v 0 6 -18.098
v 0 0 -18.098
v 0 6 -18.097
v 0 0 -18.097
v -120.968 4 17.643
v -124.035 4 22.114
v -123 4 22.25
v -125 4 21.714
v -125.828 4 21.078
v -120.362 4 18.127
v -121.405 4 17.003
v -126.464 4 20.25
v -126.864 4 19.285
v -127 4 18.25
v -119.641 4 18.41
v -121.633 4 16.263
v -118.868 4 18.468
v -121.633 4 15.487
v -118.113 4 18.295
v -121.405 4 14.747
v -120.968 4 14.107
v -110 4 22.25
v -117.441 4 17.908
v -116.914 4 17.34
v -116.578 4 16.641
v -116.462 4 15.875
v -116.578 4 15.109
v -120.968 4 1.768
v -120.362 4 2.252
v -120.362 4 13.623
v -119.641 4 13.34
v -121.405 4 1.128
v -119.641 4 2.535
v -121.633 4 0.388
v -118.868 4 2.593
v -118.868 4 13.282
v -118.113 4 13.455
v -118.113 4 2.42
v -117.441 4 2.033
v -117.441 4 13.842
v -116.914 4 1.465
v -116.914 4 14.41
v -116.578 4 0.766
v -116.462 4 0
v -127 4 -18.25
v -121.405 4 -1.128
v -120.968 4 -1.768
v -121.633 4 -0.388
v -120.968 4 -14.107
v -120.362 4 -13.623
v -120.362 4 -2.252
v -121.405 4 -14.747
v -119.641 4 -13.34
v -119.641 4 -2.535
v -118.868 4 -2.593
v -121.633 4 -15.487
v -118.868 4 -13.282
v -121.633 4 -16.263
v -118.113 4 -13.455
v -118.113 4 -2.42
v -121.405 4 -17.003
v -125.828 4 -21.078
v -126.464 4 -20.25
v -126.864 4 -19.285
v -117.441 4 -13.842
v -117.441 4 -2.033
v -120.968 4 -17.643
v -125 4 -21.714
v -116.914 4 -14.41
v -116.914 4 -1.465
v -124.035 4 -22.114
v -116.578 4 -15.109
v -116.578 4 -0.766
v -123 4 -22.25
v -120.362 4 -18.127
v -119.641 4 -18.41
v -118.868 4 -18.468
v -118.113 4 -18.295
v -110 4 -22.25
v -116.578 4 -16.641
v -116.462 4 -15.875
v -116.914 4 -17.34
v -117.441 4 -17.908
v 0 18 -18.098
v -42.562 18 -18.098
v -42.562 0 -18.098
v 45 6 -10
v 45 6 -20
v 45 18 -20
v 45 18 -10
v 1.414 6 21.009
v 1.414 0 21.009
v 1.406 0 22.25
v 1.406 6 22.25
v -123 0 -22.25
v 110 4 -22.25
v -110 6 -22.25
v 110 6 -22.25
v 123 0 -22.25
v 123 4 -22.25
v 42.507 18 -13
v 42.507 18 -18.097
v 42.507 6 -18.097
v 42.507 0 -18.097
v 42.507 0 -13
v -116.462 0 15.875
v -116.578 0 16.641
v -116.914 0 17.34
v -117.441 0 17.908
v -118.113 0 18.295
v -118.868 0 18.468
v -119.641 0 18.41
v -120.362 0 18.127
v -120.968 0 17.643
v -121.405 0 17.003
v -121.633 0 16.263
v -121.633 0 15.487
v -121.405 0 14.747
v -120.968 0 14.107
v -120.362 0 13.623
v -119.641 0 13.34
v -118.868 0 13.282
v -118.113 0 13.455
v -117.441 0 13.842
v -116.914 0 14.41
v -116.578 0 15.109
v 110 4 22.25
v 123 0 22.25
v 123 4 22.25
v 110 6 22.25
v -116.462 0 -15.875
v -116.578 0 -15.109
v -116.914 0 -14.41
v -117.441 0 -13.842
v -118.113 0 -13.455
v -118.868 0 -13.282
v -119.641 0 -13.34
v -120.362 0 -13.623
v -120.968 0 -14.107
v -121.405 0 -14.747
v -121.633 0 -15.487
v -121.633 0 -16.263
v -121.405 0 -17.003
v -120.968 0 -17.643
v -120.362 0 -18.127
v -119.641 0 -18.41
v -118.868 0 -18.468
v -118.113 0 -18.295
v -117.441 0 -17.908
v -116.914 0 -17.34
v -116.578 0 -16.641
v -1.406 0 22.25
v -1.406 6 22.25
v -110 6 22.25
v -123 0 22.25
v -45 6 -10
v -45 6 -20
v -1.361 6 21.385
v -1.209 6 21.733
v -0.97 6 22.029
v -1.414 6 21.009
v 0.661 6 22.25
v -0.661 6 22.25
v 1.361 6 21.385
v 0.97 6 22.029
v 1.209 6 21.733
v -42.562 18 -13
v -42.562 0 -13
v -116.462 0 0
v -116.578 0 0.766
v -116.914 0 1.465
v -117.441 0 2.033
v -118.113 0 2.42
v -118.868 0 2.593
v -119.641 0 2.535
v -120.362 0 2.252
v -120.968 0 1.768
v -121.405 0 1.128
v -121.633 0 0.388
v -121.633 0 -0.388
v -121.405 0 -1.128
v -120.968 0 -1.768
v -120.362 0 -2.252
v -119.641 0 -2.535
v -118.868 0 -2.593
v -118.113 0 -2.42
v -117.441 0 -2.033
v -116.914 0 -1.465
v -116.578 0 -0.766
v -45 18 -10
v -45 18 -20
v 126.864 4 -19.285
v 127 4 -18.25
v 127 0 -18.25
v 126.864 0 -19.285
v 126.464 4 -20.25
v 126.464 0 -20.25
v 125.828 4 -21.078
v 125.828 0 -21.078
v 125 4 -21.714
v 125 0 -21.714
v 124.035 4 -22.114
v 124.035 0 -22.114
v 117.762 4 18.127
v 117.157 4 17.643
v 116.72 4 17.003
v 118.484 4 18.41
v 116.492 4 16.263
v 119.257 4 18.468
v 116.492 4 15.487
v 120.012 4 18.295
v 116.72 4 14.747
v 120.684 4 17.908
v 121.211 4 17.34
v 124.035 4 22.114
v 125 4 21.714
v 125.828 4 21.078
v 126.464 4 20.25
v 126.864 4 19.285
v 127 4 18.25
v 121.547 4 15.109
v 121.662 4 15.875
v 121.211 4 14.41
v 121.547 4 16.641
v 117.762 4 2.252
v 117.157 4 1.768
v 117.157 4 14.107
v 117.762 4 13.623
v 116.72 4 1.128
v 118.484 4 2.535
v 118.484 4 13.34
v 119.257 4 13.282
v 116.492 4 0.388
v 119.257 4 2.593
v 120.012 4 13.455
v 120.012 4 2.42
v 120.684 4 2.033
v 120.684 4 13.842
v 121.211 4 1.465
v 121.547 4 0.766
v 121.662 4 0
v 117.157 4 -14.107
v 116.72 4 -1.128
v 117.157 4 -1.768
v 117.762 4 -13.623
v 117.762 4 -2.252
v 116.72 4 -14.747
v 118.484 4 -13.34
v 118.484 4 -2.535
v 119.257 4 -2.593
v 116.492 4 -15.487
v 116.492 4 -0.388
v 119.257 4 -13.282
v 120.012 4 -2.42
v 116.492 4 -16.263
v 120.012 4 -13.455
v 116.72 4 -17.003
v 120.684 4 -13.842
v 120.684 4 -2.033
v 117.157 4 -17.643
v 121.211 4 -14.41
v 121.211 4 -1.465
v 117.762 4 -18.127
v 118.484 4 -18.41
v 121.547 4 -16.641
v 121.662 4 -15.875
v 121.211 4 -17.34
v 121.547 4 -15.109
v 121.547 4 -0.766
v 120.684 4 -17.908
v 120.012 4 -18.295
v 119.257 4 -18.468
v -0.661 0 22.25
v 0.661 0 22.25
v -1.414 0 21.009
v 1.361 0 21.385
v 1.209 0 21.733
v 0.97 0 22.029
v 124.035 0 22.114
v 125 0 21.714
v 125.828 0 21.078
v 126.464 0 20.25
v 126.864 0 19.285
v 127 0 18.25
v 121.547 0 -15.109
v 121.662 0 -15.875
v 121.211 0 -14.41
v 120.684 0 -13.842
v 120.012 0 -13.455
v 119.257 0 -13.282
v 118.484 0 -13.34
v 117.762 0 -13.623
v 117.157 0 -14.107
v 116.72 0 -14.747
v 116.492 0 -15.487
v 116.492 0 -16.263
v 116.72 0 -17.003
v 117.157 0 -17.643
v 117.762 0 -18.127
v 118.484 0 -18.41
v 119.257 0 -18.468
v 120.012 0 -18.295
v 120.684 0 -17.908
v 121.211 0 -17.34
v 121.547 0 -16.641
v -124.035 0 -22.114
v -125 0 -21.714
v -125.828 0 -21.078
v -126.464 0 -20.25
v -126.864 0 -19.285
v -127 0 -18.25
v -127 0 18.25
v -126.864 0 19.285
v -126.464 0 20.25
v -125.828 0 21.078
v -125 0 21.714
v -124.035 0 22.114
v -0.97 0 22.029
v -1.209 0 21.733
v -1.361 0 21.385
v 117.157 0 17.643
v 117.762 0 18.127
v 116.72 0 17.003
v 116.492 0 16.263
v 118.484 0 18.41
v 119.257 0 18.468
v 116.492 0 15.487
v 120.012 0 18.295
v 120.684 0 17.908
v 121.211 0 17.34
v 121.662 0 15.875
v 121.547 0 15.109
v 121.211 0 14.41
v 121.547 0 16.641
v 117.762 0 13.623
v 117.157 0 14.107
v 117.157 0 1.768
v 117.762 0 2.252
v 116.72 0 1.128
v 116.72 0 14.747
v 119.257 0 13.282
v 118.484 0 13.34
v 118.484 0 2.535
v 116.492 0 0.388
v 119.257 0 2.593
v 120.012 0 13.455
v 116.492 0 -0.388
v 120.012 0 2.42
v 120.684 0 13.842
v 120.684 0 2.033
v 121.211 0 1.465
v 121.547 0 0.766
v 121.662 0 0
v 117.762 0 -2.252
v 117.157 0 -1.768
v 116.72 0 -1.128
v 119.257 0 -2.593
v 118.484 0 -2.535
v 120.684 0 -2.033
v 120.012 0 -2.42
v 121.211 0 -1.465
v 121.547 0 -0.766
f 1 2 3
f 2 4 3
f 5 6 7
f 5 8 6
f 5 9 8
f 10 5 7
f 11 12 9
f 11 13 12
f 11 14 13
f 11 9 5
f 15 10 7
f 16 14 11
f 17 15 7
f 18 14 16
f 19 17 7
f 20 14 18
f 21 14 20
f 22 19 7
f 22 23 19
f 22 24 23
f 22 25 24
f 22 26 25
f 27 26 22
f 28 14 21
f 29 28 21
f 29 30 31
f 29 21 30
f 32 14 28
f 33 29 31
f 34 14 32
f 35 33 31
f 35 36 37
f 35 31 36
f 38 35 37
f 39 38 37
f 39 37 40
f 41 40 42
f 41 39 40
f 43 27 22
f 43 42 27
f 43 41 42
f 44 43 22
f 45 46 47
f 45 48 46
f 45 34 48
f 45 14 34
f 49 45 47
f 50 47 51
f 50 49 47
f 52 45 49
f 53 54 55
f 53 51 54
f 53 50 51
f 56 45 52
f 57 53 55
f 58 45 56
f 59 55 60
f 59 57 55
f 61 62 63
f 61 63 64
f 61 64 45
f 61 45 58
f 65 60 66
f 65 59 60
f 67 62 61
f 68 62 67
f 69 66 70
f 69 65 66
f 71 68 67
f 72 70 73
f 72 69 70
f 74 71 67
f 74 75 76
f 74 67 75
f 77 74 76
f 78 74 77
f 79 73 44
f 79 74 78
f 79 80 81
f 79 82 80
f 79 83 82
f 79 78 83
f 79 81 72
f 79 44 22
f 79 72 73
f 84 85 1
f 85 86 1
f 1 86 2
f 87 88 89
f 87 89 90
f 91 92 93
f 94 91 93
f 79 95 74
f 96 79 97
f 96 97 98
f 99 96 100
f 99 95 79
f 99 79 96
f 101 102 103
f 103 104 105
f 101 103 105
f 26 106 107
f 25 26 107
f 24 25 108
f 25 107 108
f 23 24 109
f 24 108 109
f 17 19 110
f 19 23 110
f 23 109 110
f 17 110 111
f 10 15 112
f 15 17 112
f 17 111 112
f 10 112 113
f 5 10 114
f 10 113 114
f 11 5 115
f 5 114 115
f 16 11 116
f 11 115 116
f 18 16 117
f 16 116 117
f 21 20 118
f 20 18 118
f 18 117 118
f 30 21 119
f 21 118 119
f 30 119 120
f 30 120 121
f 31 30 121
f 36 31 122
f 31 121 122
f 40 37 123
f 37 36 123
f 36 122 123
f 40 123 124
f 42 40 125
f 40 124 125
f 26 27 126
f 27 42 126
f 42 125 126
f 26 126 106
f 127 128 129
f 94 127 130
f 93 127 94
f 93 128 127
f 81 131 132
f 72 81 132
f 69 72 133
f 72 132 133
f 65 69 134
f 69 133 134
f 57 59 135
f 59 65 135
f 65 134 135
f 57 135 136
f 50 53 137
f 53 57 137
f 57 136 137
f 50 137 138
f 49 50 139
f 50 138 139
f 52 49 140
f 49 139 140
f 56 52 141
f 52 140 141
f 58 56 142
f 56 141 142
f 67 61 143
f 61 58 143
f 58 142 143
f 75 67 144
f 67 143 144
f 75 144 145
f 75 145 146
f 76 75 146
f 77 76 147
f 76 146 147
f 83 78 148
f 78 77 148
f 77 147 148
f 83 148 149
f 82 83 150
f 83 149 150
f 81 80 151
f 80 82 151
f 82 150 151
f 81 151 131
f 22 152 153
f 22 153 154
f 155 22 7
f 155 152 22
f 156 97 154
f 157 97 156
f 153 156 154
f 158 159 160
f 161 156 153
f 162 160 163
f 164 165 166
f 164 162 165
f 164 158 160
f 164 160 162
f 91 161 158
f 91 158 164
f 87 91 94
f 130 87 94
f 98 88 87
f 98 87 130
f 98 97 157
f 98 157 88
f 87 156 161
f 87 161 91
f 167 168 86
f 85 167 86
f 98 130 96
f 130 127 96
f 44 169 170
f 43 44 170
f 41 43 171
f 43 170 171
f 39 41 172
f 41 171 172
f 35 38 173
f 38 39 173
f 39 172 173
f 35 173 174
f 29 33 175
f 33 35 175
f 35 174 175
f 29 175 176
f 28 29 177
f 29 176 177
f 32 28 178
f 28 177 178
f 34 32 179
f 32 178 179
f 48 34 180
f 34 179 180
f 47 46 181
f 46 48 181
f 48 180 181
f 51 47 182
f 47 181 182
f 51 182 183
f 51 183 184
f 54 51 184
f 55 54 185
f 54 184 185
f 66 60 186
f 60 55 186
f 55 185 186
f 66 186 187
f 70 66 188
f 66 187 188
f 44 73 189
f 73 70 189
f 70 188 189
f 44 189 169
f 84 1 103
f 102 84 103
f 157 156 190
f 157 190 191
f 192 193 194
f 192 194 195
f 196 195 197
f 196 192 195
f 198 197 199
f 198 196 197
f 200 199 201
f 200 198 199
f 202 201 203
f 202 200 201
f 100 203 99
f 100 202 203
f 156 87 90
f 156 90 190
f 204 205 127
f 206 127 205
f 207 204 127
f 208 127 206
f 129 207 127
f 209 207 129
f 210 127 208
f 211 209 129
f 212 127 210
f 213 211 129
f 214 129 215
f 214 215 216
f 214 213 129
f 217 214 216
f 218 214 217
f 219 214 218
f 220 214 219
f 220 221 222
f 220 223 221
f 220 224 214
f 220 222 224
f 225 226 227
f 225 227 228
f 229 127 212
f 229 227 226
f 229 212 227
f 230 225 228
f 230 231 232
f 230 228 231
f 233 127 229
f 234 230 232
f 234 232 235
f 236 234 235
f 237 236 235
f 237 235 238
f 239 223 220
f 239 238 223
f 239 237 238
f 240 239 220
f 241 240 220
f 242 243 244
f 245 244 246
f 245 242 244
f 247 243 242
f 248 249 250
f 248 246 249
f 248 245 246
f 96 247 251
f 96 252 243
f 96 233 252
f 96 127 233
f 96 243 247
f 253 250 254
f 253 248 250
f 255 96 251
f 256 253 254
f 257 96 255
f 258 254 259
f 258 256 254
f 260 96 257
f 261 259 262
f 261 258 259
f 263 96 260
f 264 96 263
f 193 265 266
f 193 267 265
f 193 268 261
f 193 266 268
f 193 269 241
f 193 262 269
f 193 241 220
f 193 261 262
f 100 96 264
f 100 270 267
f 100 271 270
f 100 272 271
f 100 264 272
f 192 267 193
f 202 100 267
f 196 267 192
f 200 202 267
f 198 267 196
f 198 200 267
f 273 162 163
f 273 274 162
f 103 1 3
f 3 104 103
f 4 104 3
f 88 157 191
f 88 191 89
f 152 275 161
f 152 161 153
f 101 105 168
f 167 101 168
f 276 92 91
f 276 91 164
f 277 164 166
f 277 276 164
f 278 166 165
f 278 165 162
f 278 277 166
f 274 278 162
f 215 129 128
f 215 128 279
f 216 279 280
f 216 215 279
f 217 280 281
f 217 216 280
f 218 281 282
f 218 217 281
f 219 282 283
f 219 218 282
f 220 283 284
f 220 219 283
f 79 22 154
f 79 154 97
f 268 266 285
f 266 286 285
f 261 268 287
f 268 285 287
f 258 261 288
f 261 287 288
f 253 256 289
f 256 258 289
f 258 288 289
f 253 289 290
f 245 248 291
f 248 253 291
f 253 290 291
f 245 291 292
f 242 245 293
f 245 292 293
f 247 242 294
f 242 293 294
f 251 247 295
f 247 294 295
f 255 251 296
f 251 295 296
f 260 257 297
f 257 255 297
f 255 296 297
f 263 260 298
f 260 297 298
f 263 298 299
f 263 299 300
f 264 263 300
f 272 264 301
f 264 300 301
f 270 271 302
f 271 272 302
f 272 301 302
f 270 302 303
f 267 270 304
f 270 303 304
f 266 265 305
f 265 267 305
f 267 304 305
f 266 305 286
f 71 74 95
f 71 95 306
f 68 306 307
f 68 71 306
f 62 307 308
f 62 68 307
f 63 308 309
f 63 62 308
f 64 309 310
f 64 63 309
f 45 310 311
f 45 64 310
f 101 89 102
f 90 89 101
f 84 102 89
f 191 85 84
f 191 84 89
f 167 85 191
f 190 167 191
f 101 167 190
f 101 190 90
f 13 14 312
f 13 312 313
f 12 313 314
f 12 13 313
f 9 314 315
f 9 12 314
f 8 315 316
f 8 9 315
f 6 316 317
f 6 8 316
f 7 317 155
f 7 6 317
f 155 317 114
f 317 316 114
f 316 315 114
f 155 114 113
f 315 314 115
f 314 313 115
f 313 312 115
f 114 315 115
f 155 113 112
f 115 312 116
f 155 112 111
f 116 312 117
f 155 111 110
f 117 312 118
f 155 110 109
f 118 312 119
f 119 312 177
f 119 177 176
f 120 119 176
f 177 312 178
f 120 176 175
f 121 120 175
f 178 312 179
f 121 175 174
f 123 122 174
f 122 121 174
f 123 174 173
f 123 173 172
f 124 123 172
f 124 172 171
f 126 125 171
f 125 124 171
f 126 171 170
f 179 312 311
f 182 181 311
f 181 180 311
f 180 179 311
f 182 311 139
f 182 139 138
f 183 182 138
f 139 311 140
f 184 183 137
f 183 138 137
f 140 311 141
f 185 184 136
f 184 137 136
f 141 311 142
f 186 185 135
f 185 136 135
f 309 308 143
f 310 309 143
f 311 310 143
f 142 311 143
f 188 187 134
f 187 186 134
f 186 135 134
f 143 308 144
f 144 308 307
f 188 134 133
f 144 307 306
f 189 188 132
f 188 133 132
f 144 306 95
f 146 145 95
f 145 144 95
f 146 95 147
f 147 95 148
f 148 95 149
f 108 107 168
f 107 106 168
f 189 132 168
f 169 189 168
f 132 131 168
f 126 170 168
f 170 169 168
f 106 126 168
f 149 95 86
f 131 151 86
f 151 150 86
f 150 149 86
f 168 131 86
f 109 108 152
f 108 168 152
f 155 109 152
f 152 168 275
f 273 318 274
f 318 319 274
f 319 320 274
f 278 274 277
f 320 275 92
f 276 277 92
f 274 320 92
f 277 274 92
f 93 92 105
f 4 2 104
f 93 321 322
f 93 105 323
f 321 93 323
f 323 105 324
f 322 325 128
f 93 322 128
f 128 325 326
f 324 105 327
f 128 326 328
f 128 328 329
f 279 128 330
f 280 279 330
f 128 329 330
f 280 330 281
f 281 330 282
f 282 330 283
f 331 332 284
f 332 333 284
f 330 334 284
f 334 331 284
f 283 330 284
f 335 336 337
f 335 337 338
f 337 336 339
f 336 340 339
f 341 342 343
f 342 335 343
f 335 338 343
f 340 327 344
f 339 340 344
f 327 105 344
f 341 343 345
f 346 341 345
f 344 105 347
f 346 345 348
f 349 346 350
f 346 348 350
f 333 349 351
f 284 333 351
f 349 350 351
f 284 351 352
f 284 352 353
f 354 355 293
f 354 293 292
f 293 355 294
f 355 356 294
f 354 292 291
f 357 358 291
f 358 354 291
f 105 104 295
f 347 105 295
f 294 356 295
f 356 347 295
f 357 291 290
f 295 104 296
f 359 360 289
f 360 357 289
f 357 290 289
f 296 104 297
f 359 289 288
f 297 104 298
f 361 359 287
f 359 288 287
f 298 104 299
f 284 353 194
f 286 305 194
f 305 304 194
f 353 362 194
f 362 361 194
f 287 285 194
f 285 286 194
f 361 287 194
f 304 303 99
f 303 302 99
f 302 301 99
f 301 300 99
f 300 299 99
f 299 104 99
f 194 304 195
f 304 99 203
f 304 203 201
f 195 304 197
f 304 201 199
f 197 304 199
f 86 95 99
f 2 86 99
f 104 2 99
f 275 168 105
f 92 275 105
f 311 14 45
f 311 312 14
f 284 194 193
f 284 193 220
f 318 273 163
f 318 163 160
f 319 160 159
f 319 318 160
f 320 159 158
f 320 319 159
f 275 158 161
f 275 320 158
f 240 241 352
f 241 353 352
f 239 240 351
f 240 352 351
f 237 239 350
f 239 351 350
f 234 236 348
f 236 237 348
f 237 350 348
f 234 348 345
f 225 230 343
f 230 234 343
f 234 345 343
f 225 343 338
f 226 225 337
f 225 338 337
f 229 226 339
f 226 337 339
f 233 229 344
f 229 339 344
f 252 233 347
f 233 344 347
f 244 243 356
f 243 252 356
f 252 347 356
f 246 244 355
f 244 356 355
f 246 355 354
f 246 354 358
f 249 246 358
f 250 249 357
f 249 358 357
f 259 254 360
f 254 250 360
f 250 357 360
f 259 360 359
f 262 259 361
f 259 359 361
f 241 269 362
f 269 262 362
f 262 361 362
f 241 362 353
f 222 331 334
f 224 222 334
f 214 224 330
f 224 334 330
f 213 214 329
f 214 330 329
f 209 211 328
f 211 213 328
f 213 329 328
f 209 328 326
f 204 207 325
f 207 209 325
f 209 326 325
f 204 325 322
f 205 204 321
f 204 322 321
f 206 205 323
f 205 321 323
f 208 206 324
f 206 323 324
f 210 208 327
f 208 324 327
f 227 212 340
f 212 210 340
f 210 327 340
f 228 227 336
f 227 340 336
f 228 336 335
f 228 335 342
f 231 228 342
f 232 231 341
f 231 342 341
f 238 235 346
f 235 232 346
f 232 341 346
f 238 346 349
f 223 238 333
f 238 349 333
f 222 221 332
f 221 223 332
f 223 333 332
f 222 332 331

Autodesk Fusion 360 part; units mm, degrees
sketch "Sketch1" plane through (0, 0, 0) normal (0, 1, 0) x (1, 0, 0)
  line L0 (127, -22.25) -> (-127, -22.25)
  line L1 (-127, -22.25) -> (-127, 22.25)
  line L2 (-127, 22.25) -> (127, 22.25)
  line L3 (127, 22.25) -> (127, -22.25)
  line L4 (127, -22.25) -> (-127, 22.25) construction
  line L5 (-127, -22.25) -> (127, 22.25) construction
  line L6 (-127, -22.25) -> (-111.125, -22.25) construction
  line L7 (-111.125, -22.25) -> (-111.125, 22.25) construction
  line L8 (-111.125, 22.25) -> (-127, 22.25) construction
  line L9 (-127, 22.25) -> (-127, -22.25) construction
  line L10 (-127, -22.25) -> (-110, -22.25)
  line L11 (-110, -22.25) -> (-110, 22.25)
  line L12 (-110, 22.25) -> (-127, 22.25)
  line L13 (-127, 22.25) -> (-127, -22.25)
  line L14 (-127, -22.25) -> (-111.125, 22.25) construction
  circle A0 centre (-119.0625, 0) radius 2.6
  circle A1 centre (-119.0625, 0) radius 2.5 construction
  circle A2 centre (-119.0625, -15.875) radius 2.6
  circle A3 centre (-119.0625, 15.875) radius 2.6
  line L15 (0, -22.25) -> (0, 22.25) construction
  circle A4 centre (119.0625, -15.875) radius 2.6
  line L16 (127, 22.25) -> (127, -22.25)
  line L17 (111.125, -22.25) -> (111.125, 22.25) construction
  line L18 (127, -22.25) -> (111.125, 22.25) construction
  line L19 (127, -22.25) -> (127, 22.25)
  line L20 (110, -22.25) -> (110, 22.25)
  line L21 (127, -22.25) -> (111.125, -22.25) construction
  circle A5 centre (119.0625, 0) radius 2.5 construction
  line L22 (111.125, 22.25) -> (127, 22.25) construction
  circle A6 centre (119.0625, 15.875) radius 2.6
  line L23 (110, 22.25) -> (127, 22.25)
  line L24 (127, 22.25) -> (127, -22.25) construction
  circle A7 centre (119.0625, 0) radius 2.6
  line L25 (127, -22.25) -> (110, -22.25)
  dimension "d1" = 254
  dimension "d2" = 44.5
  dimension "d3" = 15.875
  dimension "d4" = 17
  dimension "d5" = 5.2
  dimension "d9" = 0
  dimension "d10" = 15.875
  dimension "d18" = 15.875
extrude "Extrude1" add sketch "Sketch1" along normal blind 4
extrude "Extrude2" add sketch "Sketch1" along normal blind 6 contours L0 L2 L11 L20
fillet "Fillet1" radius 4 4 edges at (127, 2, 22.25) (127, 2, -22.25) (-127, 2, -22.25) (-127, 2, 22.25)
sketch "Sketch2" plane through (0, 0, 0) normal (0, 1, 0) x (1, 0, 0)
  line L0 (0, 13) -> (-42.5625, 13)
  line L1 (-42.5625, 13) -> (-42.5625, 18.0675)
  line L2 (-42.5625, 18.0675) -> (0, 18.0675)
  line L3 (0, 18.0675) -> (0, 13)
  line L4 (0, 13) -> (42.5073, 13)
  line L5 (42.5073, 13) -> (42.5073, 18.0969)
  line L6 (42.5073, 18.0969) -> (0, 18.0969)
  line L7 (0, 18.0969) -> (0, 13)
extrude "Extrude3" cut sketch "Sketch2" along normal blind 460
extrude "Extrude4" cut 1 faces at (-28.375, 4, -18.0675) along direction (0, 0, -1) blind 0.03
sketch "Sketch3" plane through (0, 6, 0) normal (0, 1, 0) x (-1, 0, 0)
  line L0 (0, -18.0975) -> (0, -18.0969)
  line L1 (0, -18.0969) -> (-42.5073, -18.0969)
  line L2 (-42.5073, -18.0969) -> (-42.5073, -13)
  line L3 (-42.5073, -13) -> (42.5625, -13)
  line L4 (42.5625, -13) -> (42.5625, -18.0975)
  line L5 (42.5625, -18.0975) -> (0, -18.0975)
  line L6 (110, 22.25) -> (-110, 22.25)
  line L7 (-110, 22.25) -> (-110, -22.25)
  line L8 (-110, -22.25) -> (110, -22.25)
  line L9 (110, -22.25) -> (110, 22.25)
  line L10 (-45, -10) -> (45, -10)
  line L11 (45, -10) -> (45, -20)
  line L12 (45, -20) -> (-45, -20)
  line L13 (-45, -20) -> (-45, -10)
extrude "Extrude5" add sketch "Sketch3" along normal blind 12 contours L10 L11 L12 L13
sketch "Sketch4" plane through (0, 0, 0) normal (0, -1, 0) x (1, 0, 0)
  arc A0 (-123, 22.25) -> (-127, 18.25) centre (-123, 18.25) ccw
  line L0 (-127, 18.25) -> (-127, -18.25)
  arc A1 (-127, -18.25) -> (-123, -22.25) centre (-123, -18.25) ccw
  line L1 (-123, -22.25) -> (123, -22.25)
  arc A2 (123, -22.25) -> (127, -18.25) centre (123, -18.25) ccw
  line L2 (127, -18.25) -> (127, 18.25)
  arc A3 (127, 18.25) -> (123, 22.25) centre (123, 18.25) ccw
  line L3 (123, 22.25) -> (-123, 22.25)
  circle A4 centre (119.0625, 0) radius 2.6
  circle A5 centre (119.0625, 15.875) radius 2.6
  circle A6 centre (119.0625, -15.875) radius 2.6
  circle A7 centre (-119.0625, 15.875) radius 2.6
  circle A8 centre (-119.0625, -15.875) radius 2.6
  circle A9 centre (-119.0625, 0) radius 2.6
  line L4 (0, -18.0969) -> (0, -18.0975)
  line L5 (0, -18.0975) -> (-42.5625, -18.0975)
  line L6 (-42.5625, -18.0975) -> (-42.5625, -13)
  line L7 (-42.5625, -13) -> (42.5073, -13)
  line L8 (42.5073, -13) -> (42.5073, -18.0969)
  line L9 (42.5073, -18.0969) -> (0, -18.0969)
  circle A10 centre (0, 21) radius 1.4142
  line L10 (-1.4142, 21.0088) -> (-1.4065, 22.25)
  line L11 (1.4142, 21.0088) -> (1.4065, 22.25)
extrude "Extrude6" cut sketch "Sketch4" against normal blind 11.5 contours L3 A10 L10 | L3 A10 | L3 A10 L11 picked at (0.2336, 20.1841)
